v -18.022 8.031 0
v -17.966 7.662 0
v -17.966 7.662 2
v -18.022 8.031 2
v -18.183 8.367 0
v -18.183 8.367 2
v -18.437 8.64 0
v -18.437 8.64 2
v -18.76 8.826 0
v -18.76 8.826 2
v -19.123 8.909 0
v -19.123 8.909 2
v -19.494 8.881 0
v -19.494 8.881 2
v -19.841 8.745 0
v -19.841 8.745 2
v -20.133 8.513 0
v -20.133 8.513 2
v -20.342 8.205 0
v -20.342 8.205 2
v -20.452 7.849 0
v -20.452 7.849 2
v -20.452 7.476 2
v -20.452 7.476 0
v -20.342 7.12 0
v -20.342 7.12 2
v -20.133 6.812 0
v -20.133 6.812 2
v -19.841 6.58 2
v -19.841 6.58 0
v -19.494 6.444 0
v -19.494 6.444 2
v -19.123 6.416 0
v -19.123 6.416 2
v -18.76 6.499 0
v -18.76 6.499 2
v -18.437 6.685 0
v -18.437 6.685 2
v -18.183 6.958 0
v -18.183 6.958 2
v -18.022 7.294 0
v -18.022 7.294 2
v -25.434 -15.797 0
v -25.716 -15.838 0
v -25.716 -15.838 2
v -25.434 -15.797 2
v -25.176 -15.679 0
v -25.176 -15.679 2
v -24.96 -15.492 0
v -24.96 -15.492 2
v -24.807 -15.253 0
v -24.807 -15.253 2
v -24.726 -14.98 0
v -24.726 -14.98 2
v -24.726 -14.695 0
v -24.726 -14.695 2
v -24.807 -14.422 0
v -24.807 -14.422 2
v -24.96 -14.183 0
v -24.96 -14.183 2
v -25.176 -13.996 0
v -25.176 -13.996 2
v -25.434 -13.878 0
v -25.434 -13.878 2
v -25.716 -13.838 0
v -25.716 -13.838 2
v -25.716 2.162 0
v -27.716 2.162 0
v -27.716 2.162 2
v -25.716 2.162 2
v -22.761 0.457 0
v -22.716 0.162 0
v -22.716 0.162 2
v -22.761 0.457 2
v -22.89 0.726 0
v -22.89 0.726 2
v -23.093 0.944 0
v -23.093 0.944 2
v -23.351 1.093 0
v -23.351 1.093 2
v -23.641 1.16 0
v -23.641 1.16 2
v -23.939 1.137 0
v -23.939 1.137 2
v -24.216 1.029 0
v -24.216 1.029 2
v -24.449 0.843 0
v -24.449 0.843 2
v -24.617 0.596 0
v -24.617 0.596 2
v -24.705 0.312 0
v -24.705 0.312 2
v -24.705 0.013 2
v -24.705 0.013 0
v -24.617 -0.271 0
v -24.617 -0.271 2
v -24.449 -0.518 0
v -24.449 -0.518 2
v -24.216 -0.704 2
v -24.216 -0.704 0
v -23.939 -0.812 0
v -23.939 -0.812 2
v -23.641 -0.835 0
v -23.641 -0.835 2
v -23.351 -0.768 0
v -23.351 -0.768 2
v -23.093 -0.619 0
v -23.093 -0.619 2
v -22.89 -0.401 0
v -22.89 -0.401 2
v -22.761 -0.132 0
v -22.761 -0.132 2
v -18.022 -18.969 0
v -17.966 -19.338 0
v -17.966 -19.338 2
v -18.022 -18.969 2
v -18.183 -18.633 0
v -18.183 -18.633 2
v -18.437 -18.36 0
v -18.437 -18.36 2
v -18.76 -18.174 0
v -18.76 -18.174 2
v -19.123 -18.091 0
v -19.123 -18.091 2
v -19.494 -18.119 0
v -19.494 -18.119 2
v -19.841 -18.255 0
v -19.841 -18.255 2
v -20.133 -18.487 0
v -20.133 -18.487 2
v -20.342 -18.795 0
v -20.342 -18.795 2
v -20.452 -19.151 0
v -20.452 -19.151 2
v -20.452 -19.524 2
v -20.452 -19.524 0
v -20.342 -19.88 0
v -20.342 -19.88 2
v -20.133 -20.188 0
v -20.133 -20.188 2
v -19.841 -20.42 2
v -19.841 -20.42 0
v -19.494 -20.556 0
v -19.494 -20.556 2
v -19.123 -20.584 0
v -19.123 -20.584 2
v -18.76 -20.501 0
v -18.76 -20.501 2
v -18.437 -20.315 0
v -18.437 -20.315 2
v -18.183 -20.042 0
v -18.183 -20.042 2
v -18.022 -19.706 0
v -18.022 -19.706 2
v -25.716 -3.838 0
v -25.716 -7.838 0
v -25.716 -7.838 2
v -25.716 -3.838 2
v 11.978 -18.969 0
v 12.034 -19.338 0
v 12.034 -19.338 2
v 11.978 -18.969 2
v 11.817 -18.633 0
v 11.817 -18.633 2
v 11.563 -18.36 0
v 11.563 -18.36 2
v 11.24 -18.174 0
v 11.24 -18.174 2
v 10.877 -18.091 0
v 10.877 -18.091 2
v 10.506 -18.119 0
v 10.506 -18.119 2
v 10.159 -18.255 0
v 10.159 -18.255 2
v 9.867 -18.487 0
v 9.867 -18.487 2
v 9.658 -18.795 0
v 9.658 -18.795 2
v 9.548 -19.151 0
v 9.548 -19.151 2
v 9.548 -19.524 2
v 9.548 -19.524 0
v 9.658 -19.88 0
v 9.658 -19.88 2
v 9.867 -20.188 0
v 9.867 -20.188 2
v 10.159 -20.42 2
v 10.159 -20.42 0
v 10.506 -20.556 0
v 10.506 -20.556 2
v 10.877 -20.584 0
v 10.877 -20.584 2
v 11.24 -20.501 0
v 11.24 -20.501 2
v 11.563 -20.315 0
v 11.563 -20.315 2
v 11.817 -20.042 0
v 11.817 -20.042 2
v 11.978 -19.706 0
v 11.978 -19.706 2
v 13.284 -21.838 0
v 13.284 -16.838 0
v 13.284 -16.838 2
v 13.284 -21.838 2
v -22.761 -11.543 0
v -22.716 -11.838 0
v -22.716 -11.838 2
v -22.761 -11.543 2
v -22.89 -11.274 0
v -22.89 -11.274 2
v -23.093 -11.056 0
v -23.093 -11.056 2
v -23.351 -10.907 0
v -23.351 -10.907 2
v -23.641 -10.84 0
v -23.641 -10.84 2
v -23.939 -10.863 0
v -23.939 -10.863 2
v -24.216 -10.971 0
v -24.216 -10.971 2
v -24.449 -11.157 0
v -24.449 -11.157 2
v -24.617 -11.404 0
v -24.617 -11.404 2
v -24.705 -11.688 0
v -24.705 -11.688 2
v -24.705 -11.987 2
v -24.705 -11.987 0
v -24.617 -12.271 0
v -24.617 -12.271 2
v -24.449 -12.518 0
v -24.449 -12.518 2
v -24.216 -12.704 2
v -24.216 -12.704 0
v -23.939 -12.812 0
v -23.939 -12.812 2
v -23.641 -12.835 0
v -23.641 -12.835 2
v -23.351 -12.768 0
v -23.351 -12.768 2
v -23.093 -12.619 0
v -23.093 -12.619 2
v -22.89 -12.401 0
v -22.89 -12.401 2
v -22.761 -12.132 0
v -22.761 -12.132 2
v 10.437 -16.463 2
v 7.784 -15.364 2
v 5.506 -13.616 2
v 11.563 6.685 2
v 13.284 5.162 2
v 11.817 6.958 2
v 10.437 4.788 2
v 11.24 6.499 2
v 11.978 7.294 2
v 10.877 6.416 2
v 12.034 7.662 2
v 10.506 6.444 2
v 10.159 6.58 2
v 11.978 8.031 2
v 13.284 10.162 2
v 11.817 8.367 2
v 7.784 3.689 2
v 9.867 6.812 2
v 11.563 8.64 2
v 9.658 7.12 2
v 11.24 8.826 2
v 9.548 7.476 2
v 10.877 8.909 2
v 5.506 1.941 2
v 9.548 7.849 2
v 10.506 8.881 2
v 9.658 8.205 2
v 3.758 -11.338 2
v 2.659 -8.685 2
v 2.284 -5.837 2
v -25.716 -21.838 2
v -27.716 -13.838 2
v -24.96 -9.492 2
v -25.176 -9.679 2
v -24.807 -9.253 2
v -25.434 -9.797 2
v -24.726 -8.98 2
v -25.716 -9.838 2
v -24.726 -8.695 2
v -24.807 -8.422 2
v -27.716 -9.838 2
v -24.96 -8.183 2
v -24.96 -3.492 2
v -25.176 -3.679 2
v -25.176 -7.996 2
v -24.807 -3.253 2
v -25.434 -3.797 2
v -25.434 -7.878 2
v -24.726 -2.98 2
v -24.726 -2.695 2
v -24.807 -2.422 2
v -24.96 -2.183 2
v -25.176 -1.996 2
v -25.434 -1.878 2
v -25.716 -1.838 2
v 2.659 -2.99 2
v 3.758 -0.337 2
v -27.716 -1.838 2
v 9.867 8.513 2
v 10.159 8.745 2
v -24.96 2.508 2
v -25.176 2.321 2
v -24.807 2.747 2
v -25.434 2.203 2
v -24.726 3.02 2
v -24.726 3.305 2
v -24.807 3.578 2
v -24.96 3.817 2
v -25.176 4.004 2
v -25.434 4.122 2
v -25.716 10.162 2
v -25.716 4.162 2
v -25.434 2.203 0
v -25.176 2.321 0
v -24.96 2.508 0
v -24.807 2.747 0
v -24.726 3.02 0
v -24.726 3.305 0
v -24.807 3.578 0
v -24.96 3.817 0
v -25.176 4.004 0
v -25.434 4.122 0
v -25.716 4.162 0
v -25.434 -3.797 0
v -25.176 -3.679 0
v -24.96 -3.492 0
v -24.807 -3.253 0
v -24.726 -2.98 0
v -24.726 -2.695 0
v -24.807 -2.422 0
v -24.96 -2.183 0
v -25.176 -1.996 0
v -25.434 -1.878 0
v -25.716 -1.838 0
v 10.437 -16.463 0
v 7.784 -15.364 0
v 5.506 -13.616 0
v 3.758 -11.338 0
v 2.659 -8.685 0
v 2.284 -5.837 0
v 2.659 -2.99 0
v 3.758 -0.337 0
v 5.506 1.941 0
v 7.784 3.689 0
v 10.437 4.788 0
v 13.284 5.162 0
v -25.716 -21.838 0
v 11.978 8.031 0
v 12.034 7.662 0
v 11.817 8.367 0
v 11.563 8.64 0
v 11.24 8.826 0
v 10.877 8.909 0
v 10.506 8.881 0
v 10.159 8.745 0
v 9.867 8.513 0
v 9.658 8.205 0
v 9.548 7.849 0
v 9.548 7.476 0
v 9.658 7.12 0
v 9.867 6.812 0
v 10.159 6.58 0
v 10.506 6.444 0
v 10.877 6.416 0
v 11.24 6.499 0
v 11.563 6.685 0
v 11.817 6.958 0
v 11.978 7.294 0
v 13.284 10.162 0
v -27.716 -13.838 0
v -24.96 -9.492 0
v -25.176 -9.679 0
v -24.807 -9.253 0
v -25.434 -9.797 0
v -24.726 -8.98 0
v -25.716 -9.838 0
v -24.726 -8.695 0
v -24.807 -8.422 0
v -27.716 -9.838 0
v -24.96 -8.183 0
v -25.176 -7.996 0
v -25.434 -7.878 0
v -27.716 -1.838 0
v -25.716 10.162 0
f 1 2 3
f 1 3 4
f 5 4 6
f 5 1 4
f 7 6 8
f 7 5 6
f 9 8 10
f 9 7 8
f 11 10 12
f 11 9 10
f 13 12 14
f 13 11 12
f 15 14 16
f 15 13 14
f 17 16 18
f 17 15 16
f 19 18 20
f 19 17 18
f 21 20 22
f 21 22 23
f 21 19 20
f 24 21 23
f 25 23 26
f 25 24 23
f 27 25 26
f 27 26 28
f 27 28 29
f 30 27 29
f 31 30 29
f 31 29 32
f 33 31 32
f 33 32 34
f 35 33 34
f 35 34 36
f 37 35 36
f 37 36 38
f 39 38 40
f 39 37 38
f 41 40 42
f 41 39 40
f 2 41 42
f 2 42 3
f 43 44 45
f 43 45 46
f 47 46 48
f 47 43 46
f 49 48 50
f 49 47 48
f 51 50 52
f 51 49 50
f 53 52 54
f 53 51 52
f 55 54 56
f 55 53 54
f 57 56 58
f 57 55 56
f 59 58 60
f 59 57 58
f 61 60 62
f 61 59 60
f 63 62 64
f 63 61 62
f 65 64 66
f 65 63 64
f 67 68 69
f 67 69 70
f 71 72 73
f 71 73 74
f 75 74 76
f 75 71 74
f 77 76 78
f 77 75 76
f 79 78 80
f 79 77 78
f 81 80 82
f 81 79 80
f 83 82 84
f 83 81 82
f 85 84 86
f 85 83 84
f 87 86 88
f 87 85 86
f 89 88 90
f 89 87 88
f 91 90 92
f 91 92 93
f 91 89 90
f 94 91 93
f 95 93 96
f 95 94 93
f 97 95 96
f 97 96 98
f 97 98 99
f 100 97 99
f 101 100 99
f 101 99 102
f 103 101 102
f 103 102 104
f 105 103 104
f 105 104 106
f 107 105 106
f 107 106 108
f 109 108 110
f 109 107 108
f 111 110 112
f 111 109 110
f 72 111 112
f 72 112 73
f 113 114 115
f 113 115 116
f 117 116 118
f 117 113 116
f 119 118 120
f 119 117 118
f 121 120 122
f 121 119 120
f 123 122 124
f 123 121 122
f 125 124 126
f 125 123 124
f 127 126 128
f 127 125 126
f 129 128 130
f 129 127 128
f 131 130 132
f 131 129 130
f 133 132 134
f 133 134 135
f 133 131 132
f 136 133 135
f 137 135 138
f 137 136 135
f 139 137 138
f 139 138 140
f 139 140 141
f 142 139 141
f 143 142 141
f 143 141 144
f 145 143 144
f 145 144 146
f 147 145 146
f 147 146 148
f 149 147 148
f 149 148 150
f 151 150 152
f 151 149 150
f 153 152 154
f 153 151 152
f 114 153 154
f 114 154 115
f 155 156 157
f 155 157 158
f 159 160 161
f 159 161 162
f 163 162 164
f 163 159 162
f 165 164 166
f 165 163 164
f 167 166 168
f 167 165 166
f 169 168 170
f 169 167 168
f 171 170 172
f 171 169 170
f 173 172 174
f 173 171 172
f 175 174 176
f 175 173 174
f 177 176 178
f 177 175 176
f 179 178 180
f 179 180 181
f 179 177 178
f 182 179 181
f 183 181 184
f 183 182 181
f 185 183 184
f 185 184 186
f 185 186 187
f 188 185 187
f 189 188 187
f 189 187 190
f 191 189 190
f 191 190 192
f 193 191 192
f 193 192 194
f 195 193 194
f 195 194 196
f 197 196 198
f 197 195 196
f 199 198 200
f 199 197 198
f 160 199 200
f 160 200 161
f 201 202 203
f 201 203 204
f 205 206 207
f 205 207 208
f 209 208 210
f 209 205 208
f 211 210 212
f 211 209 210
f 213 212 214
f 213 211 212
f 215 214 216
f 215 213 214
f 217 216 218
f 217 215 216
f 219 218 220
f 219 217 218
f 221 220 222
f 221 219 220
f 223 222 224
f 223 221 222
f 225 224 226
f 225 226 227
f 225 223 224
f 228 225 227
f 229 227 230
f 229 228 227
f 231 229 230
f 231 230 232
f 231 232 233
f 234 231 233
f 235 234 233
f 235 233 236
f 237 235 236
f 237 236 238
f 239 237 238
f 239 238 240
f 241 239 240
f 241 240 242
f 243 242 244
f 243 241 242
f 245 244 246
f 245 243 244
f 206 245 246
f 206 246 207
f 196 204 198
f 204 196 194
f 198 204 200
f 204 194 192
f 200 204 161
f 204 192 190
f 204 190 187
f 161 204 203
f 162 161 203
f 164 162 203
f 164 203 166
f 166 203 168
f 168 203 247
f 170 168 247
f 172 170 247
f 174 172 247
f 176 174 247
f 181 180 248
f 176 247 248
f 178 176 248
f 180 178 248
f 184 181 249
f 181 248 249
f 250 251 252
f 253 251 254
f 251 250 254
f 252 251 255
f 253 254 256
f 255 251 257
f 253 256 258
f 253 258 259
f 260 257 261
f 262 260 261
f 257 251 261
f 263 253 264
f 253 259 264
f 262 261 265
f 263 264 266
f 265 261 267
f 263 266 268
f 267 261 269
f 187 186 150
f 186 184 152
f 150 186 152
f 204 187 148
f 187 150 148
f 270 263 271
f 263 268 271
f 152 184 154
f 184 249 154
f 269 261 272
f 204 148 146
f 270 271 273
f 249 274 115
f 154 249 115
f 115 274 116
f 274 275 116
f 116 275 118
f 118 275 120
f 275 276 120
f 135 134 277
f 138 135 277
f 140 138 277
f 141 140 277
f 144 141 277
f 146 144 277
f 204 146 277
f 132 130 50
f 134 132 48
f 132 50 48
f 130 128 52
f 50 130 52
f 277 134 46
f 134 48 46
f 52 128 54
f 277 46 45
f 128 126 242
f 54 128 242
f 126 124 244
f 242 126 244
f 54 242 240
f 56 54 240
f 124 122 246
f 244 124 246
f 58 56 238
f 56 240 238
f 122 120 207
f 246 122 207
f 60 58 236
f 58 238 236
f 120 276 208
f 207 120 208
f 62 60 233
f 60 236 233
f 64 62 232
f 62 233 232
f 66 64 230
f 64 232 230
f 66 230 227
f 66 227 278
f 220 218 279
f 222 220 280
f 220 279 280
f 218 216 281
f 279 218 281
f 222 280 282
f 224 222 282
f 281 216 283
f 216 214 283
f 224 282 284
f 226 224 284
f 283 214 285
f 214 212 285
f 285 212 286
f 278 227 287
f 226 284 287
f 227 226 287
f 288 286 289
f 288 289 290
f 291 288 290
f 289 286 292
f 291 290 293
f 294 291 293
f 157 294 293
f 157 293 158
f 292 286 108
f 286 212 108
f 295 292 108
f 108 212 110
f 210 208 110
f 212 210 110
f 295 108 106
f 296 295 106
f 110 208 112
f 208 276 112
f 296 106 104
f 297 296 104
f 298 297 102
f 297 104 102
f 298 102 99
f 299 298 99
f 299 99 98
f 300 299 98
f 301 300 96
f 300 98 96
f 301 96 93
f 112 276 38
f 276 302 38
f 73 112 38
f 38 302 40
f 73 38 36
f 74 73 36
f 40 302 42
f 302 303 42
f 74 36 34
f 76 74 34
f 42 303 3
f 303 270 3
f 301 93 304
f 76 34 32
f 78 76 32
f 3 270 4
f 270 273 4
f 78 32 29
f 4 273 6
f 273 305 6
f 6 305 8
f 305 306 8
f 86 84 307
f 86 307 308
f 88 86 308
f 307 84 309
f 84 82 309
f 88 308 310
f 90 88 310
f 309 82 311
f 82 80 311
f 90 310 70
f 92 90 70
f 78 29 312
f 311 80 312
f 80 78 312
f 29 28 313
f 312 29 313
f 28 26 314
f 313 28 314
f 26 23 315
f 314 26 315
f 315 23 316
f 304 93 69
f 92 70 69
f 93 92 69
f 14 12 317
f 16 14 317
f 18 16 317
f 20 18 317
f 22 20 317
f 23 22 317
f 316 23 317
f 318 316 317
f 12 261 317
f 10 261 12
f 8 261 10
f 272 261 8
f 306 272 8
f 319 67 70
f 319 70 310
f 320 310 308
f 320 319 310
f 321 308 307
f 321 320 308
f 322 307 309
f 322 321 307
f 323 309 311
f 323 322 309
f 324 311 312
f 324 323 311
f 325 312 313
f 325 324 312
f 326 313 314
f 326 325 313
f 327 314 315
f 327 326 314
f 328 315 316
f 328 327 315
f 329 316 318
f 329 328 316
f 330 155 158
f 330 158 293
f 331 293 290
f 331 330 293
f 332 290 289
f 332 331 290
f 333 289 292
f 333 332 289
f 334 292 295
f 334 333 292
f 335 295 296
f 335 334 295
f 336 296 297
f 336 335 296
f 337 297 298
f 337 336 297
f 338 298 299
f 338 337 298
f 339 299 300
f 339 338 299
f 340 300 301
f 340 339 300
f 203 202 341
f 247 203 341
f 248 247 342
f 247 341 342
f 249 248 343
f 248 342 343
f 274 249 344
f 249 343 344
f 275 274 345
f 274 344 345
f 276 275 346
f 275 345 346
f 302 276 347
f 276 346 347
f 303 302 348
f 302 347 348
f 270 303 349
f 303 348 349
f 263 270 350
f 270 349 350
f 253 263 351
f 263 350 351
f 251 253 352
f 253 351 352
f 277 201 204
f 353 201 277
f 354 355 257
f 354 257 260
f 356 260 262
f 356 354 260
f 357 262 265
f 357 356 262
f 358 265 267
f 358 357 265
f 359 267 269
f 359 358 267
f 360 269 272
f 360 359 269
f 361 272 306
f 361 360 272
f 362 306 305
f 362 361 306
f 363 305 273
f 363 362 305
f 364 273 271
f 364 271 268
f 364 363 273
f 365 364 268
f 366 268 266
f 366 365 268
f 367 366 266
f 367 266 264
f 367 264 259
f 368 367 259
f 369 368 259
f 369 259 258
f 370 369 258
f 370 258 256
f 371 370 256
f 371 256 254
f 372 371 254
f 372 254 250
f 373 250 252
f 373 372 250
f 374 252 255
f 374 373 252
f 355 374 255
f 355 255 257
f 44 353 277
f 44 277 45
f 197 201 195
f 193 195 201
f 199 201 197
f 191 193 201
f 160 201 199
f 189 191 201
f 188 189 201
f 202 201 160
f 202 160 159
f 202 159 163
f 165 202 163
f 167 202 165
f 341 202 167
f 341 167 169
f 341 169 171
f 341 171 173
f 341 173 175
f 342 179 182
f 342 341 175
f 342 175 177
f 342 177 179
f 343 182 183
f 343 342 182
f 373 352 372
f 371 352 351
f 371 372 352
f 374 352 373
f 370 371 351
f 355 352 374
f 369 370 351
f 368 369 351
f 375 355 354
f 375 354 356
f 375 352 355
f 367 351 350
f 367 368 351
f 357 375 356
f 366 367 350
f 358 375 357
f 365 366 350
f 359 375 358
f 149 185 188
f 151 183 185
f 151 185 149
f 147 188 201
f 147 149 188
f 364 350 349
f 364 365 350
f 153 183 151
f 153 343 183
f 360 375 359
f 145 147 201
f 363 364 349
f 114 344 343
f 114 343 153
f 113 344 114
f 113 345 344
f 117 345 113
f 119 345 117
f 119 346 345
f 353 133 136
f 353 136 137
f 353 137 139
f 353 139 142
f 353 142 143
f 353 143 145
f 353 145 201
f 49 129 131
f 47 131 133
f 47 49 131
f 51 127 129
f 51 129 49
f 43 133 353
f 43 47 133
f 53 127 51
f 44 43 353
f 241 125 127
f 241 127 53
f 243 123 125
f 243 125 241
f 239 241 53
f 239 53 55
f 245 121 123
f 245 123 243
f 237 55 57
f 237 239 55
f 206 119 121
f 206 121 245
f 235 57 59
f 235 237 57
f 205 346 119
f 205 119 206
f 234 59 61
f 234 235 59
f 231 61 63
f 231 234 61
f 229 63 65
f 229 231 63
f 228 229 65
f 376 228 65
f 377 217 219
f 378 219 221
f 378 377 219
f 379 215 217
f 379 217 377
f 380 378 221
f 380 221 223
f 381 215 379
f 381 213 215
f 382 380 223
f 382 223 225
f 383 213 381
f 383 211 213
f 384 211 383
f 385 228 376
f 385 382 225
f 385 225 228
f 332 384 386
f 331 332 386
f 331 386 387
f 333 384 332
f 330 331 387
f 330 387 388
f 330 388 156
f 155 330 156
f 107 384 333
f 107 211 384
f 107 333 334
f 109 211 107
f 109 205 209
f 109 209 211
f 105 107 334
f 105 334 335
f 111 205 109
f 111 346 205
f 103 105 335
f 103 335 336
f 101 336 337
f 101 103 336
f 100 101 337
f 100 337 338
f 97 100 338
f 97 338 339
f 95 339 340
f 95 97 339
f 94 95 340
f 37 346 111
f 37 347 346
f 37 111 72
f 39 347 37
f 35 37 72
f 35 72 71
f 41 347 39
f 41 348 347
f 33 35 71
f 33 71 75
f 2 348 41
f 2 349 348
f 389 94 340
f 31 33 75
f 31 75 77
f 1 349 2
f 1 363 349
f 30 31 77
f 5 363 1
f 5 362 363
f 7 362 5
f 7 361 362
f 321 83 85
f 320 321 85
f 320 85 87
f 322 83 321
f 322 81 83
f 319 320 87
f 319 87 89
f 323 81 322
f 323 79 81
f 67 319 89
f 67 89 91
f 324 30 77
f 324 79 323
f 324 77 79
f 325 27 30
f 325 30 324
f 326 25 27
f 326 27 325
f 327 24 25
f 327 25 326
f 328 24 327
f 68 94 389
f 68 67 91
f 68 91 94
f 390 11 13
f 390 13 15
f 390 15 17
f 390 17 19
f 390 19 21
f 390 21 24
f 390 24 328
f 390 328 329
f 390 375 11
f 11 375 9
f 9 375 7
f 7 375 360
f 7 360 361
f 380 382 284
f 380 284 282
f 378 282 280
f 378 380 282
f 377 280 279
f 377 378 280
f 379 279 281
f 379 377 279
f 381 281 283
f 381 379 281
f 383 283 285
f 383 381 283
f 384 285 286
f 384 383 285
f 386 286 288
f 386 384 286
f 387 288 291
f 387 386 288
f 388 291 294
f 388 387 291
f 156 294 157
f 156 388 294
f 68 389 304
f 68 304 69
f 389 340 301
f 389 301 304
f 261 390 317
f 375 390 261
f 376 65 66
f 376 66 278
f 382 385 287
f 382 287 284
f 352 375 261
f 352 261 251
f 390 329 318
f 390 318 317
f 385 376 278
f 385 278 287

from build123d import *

# Parameters (mm, degrees)
SKETCH_1_R          = 1.25
SKETCH_1_R_2        = 1
EXTRUDE_1_DEPTH     = 2
CUT_EXTRUDE_1_DEPTH = 2


with BuildPart() as part:
    # 草圖1 → 填料-伸長1 (new body)
    with BuildSketch(Plane.XY):
        with BuildLine():
            Line((-17.216213198, 10.1625), (13.283786802, 10.1625))
            Line((13.283786802, 10.1625), (13.283786802, -21.8375))
            Line((13.283786802, -21.8375), (-17.216213198, -21.8375))
            Line((-17.216213198, -21.8375), (-19.716213198, -21.8375))
            Line((-19.716213198, -21.8375), (-25.716213198, -21.8375))
            Line((-25.716213198, -21.8375), (-25.716213198, -15.8375))
            ThreePointArc((-25.716213198, -15.8375), (-24.716213198, -14.8375), (-25.716213198, -13.8375))
            Line((-25.716213198, -13.8375), (-27.716213198, -13.8375))
            Line((-27.716213198, -13.8375), (-27.716213198, -9.8375))
            Line((-27.716213198, -9.8375), (-25.716213198, -9.8375))
            ThreePointArc((-25.716213198, -9.8375), (-24.716213198, -8.8375), (-25.716213198, -7.8375))
            Line((-25.716213198, -7.8375), (-25.716213198, -3.8375))
            ThreePointArc((-25.716213198, -3.8375), (-24.716213198, -2.8375), (-25.716213198, -1.8375))
            Line((-25.716213198, -1.8375), (-27.716213198, -1.8375))
            Line((-27.716213198, -1.8375), (-27.716213198, 2.1625))
            Line((-27.716213198, 2.1625), (-25.716213198, 2.1625))
            ThreePointArc((-25.716213198, 2.1625), (-24.716213198, 3.1625), (-25.716213198, 4.1625))
            Line((-25.716213198, 4.1625), (-25.716213198, 10.1625))
            Line((-25.716213198, 10.1625), (-21.716213198, 10.1625))
            Line((-21.716213198, 10.1625), (-17.216213198, 10.1625))
        make_face()
        with Locations((-19.216213198, 7.6625)):
            Circle(SKETCH_1_R, mode=Mode.SUBTRACT)
        with Locations((-19.216213198, -19.3375)):
            Circle(SKETCH_1_R, mode=Mode.SUBTRACT)
        with Locations((10.783786802, -19.3375)):
            Circle(SKETCH_1_R, mode=Mode.SUBTRACT)
        with Locations((10.783786802, 7.6625)):
            Circle(SKETCH_1_R, mode=Mode.SUBTRACT)
        with Locations((-23.716213198, 0.1625)):
            Circle(SKETCH_1_R_2, mode=Mode.SUBTRACT)
        with Locations((-23.716213198, -11.8375)):
            Circle(SKETCH_1_R_2, mode=Mode.SUBTRACT)
    extrude(amount=EXTRUDE_1_DEPTH)

    # 草圖4 → 除料-伸長1 (cut)
    with BuildSketch(Plane(origin=(0, 0, 0), x_dir=(-1, 0, 0), z_dir=(0, 0, -1))):
        with BuildLine():
            Line((-13.283786802, 5.1625), (-13.283786802, -16.8375))
            ThreePointArc((-13.283786802, -16.8375), (-2.283786802, -5.8375), (-13.283786802, 5.1625))
        make_face()
    extrude(amount=-CUT_EXTRUDE_1_DEPTH, mode=Mode.SUBTRACT)


solid = part.part
